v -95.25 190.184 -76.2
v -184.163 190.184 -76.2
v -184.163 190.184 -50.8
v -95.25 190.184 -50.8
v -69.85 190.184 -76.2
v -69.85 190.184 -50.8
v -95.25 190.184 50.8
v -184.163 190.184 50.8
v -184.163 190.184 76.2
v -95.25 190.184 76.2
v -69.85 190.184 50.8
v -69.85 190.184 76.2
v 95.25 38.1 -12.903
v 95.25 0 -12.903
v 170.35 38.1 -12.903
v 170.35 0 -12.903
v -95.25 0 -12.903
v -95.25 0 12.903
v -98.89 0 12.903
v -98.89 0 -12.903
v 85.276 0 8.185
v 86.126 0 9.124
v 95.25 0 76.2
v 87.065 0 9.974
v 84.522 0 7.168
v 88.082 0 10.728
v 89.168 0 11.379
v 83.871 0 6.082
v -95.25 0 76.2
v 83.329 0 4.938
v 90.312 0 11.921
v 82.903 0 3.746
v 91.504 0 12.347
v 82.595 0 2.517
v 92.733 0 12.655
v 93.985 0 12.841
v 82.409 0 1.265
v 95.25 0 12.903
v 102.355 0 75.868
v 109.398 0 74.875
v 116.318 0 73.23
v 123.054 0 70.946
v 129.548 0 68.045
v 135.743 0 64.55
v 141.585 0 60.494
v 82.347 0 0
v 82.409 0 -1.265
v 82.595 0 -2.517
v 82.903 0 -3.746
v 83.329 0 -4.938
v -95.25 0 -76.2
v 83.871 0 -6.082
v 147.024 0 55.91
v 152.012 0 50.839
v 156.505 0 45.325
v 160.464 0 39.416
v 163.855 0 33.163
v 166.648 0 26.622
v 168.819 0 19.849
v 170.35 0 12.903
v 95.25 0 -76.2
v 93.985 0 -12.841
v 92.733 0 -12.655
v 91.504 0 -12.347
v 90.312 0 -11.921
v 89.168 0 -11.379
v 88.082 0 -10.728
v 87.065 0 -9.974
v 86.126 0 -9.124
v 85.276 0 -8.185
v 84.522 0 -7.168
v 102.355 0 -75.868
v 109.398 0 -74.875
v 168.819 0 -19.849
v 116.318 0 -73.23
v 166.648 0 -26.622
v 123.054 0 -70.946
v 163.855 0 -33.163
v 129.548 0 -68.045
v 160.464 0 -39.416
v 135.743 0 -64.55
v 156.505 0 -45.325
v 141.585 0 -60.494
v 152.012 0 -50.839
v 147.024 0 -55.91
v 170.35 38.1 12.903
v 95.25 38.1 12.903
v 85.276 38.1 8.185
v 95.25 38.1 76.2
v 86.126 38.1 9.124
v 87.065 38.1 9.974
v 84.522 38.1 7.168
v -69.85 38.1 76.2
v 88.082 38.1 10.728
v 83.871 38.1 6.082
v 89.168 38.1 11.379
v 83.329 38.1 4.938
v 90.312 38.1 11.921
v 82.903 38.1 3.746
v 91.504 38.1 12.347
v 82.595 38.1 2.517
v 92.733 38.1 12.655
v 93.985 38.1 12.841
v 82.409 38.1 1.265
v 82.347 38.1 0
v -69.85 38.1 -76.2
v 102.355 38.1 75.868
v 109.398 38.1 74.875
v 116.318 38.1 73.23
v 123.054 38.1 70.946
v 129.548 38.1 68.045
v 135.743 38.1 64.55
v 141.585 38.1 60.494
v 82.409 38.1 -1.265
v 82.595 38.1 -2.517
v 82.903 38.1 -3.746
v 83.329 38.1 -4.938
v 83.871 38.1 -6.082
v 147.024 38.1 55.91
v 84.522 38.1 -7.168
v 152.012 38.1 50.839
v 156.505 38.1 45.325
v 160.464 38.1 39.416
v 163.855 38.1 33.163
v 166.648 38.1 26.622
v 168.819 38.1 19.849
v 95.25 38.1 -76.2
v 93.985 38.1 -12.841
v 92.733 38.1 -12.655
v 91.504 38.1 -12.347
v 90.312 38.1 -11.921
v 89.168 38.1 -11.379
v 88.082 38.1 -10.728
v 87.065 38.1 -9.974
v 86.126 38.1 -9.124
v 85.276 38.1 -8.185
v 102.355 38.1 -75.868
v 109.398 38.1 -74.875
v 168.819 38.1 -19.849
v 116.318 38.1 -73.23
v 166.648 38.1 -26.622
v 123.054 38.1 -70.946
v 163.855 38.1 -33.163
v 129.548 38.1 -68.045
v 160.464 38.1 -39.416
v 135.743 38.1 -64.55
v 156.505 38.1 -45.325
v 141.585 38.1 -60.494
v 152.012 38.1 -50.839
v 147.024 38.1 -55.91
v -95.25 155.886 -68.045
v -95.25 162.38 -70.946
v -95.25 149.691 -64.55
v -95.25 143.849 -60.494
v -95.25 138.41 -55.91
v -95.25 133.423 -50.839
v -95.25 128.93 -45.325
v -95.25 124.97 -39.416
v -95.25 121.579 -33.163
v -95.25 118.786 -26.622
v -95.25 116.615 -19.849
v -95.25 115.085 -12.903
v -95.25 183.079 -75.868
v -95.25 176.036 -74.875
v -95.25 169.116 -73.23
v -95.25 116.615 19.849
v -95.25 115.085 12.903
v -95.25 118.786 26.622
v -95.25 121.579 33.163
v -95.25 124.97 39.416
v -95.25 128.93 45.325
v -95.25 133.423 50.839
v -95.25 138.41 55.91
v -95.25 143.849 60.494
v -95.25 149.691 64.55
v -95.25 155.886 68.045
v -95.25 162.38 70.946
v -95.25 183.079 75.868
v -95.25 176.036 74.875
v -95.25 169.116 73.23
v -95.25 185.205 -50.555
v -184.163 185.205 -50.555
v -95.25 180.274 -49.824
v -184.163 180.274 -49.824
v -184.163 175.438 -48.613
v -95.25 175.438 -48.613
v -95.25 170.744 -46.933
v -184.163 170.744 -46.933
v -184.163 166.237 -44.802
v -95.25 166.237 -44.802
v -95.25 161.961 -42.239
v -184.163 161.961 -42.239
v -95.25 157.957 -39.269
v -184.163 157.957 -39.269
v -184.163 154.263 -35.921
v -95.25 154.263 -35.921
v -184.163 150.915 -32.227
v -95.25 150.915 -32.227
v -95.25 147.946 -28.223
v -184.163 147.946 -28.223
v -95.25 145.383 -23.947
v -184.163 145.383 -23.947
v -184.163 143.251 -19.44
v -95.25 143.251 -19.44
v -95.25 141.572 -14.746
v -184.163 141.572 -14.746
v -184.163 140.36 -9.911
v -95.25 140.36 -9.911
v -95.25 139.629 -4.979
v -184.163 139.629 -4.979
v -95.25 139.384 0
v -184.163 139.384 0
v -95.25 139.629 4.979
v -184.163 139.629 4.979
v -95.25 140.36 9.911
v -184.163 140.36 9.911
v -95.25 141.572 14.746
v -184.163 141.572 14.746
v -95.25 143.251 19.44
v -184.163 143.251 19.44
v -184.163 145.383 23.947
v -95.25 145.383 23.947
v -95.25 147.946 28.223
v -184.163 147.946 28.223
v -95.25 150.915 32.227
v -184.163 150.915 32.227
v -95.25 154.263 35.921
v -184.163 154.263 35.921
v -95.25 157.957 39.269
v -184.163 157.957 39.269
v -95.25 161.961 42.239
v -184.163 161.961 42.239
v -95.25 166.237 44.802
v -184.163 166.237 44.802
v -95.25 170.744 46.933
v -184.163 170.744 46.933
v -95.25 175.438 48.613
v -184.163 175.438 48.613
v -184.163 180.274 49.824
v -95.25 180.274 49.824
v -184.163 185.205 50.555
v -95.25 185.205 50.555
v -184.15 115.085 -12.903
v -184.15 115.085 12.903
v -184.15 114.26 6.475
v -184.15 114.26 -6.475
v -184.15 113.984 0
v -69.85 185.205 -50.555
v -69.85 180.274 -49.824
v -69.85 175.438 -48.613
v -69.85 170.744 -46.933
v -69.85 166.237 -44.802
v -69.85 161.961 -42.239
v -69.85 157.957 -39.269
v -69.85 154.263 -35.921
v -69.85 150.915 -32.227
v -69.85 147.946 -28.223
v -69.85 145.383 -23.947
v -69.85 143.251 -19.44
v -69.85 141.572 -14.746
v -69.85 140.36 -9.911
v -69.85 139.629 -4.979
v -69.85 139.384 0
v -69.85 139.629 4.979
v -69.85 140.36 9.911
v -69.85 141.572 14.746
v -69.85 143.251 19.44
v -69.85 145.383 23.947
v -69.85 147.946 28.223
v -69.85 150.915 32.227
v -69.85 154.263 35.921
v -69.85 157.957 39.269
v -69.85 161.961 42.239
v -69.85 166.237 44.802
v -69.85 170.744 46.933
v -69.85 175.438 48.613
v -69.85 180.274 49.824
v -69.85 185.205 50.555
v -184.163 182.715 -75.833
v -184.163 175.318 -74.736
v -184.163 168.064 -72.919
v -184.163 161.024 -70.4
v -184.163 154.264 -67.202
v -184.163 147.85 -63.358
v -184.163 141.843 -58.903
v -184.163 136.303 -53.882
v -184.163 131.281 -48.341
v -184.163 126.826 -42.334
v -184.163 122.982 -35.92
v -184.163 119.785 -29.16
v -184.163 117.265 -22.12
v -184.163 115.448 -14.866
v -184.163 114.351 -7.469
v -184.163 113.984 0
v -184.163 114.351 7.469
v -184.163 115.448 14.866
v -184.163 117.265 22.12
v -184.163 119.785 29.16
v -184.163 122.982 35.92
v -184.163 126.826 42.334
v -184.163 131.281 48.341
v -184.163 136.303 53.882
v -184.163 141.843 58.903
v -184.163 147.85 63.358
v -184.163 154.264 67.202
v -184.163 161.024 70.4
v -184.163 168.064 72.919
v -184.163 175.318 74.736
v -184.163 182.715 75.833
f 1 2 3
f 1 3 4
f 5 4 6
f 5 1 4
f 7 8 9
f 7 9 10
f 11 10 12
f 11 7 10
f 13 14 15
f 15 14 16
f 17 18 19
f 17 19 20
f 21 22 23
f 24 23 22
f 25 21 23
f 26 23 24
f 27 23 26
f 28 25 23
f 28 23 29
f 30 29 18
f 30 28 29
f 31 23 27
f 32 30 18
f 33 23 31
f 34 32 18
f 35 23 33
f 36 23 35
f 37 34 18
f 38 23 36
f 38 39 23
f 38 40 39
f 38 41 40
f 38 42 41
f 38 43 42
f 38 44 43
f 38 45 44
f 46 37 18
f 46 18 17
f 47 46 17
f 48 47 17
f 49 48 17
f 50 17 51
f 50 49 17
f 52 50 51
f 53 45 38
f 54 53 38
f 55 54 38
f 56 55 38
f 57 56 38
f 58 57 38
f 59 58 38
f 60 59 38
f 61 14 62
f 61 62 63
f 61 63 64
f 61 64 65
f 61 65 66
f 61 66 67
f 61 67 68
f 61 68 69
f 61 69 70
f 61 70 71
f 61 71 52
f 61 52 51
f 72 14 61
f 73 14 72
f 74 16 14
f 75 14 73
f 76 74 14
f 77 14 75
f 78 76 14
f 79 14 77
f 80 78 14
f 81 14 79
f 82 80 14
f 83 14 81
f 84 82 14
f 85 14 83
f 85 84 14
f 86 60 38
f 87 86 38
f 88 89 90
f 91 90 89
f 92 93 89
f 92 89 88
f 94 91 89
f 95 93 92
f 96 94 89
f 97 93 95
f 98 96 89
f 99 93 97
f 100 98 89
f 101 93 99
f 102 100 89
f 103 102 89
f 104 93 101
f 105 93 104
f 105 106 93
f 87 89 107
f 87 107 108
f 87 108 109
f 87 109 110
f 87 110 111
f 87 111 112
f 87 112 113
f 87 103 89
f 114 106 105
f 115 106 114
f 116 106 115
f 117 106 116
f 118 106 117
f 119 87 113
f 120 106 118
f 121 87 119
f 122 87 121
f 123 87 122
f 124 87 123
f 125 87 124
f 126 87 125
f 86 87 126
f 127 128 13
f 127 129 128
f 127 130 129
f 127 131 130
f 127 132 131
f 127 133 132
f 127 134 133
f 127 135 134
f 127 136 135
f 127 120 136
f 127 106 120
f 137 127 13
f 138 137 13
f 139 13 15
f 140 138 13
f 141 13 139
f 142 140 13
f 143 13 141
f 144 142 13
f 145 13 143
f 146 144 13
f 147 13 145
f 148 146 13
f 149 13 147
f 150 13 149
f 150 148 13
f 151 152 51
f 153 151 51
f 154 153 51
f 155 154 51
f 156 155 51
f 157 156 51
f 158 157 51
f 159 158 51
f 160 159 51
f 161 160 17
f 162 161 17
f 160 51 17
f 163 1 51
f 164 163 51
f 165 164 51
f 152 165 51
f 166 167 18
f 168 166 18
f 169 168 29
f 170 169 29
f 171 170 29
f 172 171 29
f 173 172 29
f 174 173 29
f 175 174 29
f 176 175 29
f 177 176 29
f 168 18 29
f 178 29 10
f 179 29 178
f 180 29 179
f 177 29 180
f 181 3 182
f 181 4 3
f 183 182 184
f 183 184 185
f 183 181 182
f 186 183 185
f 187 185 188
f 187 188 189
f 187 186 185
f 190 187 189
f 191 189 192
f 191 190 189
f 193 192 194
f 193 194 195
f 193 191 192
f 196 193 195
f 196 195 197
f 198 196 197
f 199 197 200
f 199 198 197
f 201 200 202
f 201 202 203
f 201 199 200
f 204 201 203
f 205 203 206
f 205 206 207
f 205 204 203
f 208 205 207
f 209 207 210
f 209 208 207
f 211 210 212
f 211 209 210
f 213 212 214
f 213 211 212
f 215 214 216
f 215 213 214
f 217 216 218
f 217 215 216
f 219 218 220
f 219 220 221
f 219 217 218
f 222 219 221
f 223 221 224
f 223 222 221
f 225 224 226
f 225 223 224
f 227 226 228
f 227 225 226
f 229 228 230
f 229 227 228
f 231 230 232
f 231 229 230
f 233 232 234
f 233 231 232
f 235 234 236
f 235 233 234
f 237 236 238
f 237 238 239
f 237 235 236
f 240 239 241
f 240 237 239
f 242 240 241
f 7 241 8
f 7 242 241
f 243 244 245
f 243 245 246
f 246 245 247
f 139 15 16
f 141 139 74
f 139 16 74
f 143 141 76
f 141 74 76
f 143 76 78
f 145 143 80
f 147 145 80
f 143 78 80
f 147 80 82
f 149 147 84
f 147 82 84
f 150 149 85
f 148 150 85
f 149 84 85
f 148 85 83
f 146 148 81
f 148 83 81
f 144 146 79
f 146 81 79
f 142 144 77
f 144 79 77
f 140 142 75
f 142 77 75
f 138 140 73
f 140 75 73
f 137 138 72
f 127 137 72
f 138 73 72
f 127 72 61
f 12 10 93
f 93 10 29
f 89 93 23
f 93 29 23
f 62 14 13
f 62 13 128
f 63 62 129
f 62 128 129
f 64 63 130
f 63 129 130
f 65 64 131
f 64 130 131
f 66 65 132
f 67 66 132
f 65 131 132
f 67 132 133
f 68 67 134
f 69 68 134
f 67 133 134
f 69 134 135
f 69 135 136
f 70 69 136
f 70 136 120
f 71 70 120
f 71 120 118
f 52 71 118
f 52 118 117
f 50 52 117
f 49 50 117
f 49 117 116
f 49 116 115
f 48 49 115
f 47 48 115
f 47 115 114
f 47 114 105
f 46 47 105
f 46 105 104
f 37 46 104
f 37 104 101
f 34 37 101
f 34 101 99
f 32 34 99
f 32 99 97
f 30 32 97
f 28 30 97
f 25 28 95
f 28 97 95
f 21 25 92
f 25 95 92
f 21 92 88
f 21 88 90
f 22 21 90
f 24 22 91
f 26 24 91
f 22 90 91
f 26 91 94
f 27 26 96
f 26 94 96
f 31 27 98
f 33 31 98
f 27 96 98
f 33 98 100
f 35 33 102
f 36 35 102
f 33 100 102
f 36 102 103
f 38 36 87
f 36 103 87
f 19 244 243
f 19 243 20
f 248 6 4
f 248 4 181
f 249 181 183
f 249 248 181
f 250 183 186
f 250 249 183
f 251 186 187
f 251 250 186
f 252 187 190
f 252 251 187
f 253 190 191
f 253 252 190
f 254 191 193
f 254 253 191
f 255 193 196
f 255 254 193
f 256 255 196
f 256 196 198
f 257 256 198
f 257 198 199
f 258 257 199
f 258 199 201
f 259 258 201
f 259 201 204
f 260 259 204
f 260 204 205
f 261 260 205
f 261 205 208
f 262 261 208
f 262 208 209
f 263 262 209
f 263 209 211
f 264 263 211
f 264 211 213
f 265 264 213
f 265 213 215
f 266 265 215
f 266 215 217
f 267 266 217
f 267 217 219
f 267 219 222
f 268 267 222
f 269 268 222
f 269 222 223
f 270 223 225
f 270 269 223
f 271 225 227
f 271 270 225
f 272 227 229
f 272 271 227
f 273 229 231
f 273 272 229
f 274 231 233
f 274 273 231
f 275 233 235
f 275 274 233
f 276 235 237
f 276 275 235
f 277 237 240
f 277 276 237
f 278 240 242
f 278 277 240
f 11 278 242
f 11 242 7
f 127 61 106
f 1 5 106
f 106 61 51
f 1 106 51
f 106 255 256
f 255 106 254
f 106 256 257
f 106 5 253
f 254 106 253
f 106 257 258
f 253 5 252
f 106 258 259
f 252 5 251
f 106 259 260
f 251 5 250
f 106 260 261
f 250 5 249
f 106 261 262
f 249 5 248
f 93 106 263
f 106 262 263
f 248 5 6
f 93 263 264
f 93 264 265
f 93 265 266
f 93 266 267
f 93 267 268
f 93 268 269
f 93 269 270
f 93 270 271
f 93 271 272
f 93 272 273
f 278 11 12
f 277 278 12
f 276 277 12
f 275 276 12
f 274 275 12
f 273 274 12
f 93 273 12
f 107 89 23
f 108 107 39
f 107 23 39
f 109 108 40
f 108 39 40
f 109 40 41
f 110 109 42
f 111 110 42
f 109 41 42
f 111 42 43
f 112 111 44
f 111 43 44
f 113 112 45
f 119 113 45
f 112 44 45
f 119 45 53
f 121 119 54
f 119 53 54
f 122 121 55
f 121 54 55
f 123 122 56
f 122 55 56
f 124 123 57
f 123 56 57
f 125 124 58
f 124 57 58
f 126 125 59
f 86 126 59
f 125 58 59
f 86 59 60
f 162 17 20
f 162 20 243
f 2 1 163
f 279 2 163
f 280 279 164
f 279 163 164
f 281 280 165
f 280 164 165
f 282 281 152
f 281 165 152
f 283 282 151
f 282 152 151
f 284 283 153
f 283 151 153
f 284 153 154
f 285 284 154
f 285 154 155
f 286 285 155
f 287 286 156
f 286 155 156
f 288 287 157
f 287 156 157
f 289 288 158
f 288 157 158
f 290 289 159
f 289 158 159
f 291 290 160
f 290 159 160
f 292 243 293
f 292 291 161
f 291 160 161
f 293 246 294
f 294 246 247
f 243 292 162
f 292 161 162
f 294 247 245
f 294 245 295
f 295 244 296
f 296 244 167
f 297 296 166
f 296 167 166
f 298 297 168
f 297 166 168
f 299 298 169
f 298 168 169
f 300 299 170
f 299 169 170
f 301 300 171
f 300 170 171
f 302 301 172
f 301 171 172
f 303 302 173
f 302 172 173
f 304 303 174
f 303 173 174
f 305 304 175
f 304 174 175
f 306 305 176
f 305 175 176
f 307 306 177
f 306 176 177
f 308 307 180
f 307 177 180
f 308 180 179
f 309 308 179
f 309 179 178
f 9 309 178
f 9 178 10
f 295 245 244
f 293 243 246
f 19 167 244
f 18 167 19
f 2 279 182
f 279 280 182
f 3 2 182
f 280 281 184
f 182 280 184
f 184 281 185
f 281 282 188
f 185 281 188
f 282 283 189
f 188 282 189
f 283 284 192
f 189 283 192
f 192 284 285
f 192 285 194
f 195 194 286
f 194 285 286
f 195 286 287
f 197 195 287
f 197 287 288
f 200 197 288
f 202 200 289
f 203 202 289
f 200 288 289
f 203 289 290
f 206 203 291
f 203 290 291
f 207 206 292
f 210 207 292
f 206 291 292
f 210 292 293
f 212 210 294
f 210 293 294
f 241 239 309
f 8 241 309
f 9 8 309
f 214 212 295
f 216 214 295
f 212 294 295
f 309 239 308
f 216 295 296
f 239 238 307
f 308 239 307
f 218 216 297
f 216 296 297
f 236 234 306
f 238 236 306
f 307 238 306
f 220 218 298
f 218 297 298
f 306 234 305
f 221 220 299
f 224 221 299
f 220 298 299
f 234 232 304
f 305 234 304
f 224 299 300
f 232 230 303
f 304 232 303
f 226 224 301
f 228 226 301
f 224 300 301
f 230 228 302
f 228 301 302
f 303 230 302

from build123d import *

# Parameters (mm, degrees)
BOSS_EXTRUDE1_DEPTH = 38.1
SKETCH2_W           = 152.4
SKETCH2_H           = 190.184169006
BOSS_EXTRUDE2_DEPTH = 25.4
SKETCH6_W           = 88.91318071
SKETCH6_H           = 25.4
REVOLVE1_ANGLE      = 180
BOSS_EXTRUDE3_DEPTH = 88.9
CUT_EXTRUDE1_DEPTH  = 88.9
SKETCH9_R           = 12.902875399
CUT_EXTRUDE2_DEPTH  = 88.9
CUT_EXTRUDE3_START  = -30.48
SKETCH11_R          = 50.8
CUT_EXTRUDE3_DEPTH  = 30.48


with BuildPart() as part:
    # Sketch1 → Boss-Extrude1 (new body)
    with BuildSketch(Plane(origin=(0, 0, 0), x_dir=(1, 0, 0), z_dir=(0, 1, 0))):
        with BuildLine():
            Line((95.25, -12.902875399), (95.25, 12.902875399))
            Line((95.25, 12.902875399), (170.34963919, 12.902875399))
            ThreePointArc((170.34963919, 12.902875399), (144.358252334, 58.265080046), (95.25, 76.2))
            Line((95.25, 76.2), (-95.25, 76.2))
            Line((-95.25, 76.2), (-95.25, -76.2))
            Line((-95.25, -76.2), (95.25, -76.2))
            ThreePointArc((95.25, -76.2), (144.358252334, -58.265080046), (170.34963919, -12.902875399))
            Line((170.34963919, -12.902875399), (95.25, -12.902875399))
        make_face()
    extrude(amount=BOSS_EXTRUDE1_DEPTH)

    # Sketch2 → Boss-Extrude2 (add)
    with BuildSketch(Plane.ZY.offset(95.25)):
        with Locations((0, 95.092084503)):
            Rectangle(SKETCH2_W, SKETCH2_H)
    extrude(amount=-BOSS_EXTRUDE2_DEPTH)

    # Sketch6 → Revolve1 (revolve)
    with BuildSketch(Plane(origin=(0, 190.184169006, 0), x_dir=(1, 0, 0), z_dir=(0, 1, 0))):
        with Locations((-139.706590355, 63.5)):
            Rectangle(SKETCH6_W, SKETCH6_H)
    revolve(axis=Axis((0, 190.184169006, 0), (-1, 0, 0)), revolution_arc=REVOLVE1_ANGLE)

    # Sketch7 → Boss-Extrude3 (add)
    with BuildSketch(Plane.ZY.offset(95.25)):
        Polygon((12.902875399, 0), (-12.902875399, 0), (-12.902875399, 115.084529816), (0, 113.984169006), (12.902875399, 115.084529816), align=None)
    extrude(amount=BOSS_EXTRUDE3_DEPTH)

    # Sketch8 → Cut-Extrude1 (cut)
    with BuildSketch(Plane.XY.offset(12.902875399)):
        Polygon((-98.890075703, 0), (-184.15, 0), (-184.15, 115.084529816), align=None)
    extrude(amount=-CUT_EXTRUDE1_DEPTH, mode=Mode.SUBTRACT)

    # Sketch9 → Cut-Extrude2 (cut)
    with BuildSketch(Plane(origin=(0, 38.1, 0), x_dir=(1, 0, 0), z_dir=(0, 1, 0))):
        with Locations((95.25, 0)):
            Circle(SKETCH9_R)
    extrude(amount=-CUT_EXTRUDE2_DEPTH, mode=Mode.SUBTRACT)

    # Sketch11 → Cut-Extrude3 (cut)
    with BuildSketch(Plane.ZY.offset(95.25).offset(CUT_EXTRUDE3_START)):
        with Locations((0, 190.184169006)):
            Circle(SKETCH11_R)
    extrude(amount=CUT_EXTRUDE3_DEPTH, mode=Mode.SUBTRACT)


solid = part.part
